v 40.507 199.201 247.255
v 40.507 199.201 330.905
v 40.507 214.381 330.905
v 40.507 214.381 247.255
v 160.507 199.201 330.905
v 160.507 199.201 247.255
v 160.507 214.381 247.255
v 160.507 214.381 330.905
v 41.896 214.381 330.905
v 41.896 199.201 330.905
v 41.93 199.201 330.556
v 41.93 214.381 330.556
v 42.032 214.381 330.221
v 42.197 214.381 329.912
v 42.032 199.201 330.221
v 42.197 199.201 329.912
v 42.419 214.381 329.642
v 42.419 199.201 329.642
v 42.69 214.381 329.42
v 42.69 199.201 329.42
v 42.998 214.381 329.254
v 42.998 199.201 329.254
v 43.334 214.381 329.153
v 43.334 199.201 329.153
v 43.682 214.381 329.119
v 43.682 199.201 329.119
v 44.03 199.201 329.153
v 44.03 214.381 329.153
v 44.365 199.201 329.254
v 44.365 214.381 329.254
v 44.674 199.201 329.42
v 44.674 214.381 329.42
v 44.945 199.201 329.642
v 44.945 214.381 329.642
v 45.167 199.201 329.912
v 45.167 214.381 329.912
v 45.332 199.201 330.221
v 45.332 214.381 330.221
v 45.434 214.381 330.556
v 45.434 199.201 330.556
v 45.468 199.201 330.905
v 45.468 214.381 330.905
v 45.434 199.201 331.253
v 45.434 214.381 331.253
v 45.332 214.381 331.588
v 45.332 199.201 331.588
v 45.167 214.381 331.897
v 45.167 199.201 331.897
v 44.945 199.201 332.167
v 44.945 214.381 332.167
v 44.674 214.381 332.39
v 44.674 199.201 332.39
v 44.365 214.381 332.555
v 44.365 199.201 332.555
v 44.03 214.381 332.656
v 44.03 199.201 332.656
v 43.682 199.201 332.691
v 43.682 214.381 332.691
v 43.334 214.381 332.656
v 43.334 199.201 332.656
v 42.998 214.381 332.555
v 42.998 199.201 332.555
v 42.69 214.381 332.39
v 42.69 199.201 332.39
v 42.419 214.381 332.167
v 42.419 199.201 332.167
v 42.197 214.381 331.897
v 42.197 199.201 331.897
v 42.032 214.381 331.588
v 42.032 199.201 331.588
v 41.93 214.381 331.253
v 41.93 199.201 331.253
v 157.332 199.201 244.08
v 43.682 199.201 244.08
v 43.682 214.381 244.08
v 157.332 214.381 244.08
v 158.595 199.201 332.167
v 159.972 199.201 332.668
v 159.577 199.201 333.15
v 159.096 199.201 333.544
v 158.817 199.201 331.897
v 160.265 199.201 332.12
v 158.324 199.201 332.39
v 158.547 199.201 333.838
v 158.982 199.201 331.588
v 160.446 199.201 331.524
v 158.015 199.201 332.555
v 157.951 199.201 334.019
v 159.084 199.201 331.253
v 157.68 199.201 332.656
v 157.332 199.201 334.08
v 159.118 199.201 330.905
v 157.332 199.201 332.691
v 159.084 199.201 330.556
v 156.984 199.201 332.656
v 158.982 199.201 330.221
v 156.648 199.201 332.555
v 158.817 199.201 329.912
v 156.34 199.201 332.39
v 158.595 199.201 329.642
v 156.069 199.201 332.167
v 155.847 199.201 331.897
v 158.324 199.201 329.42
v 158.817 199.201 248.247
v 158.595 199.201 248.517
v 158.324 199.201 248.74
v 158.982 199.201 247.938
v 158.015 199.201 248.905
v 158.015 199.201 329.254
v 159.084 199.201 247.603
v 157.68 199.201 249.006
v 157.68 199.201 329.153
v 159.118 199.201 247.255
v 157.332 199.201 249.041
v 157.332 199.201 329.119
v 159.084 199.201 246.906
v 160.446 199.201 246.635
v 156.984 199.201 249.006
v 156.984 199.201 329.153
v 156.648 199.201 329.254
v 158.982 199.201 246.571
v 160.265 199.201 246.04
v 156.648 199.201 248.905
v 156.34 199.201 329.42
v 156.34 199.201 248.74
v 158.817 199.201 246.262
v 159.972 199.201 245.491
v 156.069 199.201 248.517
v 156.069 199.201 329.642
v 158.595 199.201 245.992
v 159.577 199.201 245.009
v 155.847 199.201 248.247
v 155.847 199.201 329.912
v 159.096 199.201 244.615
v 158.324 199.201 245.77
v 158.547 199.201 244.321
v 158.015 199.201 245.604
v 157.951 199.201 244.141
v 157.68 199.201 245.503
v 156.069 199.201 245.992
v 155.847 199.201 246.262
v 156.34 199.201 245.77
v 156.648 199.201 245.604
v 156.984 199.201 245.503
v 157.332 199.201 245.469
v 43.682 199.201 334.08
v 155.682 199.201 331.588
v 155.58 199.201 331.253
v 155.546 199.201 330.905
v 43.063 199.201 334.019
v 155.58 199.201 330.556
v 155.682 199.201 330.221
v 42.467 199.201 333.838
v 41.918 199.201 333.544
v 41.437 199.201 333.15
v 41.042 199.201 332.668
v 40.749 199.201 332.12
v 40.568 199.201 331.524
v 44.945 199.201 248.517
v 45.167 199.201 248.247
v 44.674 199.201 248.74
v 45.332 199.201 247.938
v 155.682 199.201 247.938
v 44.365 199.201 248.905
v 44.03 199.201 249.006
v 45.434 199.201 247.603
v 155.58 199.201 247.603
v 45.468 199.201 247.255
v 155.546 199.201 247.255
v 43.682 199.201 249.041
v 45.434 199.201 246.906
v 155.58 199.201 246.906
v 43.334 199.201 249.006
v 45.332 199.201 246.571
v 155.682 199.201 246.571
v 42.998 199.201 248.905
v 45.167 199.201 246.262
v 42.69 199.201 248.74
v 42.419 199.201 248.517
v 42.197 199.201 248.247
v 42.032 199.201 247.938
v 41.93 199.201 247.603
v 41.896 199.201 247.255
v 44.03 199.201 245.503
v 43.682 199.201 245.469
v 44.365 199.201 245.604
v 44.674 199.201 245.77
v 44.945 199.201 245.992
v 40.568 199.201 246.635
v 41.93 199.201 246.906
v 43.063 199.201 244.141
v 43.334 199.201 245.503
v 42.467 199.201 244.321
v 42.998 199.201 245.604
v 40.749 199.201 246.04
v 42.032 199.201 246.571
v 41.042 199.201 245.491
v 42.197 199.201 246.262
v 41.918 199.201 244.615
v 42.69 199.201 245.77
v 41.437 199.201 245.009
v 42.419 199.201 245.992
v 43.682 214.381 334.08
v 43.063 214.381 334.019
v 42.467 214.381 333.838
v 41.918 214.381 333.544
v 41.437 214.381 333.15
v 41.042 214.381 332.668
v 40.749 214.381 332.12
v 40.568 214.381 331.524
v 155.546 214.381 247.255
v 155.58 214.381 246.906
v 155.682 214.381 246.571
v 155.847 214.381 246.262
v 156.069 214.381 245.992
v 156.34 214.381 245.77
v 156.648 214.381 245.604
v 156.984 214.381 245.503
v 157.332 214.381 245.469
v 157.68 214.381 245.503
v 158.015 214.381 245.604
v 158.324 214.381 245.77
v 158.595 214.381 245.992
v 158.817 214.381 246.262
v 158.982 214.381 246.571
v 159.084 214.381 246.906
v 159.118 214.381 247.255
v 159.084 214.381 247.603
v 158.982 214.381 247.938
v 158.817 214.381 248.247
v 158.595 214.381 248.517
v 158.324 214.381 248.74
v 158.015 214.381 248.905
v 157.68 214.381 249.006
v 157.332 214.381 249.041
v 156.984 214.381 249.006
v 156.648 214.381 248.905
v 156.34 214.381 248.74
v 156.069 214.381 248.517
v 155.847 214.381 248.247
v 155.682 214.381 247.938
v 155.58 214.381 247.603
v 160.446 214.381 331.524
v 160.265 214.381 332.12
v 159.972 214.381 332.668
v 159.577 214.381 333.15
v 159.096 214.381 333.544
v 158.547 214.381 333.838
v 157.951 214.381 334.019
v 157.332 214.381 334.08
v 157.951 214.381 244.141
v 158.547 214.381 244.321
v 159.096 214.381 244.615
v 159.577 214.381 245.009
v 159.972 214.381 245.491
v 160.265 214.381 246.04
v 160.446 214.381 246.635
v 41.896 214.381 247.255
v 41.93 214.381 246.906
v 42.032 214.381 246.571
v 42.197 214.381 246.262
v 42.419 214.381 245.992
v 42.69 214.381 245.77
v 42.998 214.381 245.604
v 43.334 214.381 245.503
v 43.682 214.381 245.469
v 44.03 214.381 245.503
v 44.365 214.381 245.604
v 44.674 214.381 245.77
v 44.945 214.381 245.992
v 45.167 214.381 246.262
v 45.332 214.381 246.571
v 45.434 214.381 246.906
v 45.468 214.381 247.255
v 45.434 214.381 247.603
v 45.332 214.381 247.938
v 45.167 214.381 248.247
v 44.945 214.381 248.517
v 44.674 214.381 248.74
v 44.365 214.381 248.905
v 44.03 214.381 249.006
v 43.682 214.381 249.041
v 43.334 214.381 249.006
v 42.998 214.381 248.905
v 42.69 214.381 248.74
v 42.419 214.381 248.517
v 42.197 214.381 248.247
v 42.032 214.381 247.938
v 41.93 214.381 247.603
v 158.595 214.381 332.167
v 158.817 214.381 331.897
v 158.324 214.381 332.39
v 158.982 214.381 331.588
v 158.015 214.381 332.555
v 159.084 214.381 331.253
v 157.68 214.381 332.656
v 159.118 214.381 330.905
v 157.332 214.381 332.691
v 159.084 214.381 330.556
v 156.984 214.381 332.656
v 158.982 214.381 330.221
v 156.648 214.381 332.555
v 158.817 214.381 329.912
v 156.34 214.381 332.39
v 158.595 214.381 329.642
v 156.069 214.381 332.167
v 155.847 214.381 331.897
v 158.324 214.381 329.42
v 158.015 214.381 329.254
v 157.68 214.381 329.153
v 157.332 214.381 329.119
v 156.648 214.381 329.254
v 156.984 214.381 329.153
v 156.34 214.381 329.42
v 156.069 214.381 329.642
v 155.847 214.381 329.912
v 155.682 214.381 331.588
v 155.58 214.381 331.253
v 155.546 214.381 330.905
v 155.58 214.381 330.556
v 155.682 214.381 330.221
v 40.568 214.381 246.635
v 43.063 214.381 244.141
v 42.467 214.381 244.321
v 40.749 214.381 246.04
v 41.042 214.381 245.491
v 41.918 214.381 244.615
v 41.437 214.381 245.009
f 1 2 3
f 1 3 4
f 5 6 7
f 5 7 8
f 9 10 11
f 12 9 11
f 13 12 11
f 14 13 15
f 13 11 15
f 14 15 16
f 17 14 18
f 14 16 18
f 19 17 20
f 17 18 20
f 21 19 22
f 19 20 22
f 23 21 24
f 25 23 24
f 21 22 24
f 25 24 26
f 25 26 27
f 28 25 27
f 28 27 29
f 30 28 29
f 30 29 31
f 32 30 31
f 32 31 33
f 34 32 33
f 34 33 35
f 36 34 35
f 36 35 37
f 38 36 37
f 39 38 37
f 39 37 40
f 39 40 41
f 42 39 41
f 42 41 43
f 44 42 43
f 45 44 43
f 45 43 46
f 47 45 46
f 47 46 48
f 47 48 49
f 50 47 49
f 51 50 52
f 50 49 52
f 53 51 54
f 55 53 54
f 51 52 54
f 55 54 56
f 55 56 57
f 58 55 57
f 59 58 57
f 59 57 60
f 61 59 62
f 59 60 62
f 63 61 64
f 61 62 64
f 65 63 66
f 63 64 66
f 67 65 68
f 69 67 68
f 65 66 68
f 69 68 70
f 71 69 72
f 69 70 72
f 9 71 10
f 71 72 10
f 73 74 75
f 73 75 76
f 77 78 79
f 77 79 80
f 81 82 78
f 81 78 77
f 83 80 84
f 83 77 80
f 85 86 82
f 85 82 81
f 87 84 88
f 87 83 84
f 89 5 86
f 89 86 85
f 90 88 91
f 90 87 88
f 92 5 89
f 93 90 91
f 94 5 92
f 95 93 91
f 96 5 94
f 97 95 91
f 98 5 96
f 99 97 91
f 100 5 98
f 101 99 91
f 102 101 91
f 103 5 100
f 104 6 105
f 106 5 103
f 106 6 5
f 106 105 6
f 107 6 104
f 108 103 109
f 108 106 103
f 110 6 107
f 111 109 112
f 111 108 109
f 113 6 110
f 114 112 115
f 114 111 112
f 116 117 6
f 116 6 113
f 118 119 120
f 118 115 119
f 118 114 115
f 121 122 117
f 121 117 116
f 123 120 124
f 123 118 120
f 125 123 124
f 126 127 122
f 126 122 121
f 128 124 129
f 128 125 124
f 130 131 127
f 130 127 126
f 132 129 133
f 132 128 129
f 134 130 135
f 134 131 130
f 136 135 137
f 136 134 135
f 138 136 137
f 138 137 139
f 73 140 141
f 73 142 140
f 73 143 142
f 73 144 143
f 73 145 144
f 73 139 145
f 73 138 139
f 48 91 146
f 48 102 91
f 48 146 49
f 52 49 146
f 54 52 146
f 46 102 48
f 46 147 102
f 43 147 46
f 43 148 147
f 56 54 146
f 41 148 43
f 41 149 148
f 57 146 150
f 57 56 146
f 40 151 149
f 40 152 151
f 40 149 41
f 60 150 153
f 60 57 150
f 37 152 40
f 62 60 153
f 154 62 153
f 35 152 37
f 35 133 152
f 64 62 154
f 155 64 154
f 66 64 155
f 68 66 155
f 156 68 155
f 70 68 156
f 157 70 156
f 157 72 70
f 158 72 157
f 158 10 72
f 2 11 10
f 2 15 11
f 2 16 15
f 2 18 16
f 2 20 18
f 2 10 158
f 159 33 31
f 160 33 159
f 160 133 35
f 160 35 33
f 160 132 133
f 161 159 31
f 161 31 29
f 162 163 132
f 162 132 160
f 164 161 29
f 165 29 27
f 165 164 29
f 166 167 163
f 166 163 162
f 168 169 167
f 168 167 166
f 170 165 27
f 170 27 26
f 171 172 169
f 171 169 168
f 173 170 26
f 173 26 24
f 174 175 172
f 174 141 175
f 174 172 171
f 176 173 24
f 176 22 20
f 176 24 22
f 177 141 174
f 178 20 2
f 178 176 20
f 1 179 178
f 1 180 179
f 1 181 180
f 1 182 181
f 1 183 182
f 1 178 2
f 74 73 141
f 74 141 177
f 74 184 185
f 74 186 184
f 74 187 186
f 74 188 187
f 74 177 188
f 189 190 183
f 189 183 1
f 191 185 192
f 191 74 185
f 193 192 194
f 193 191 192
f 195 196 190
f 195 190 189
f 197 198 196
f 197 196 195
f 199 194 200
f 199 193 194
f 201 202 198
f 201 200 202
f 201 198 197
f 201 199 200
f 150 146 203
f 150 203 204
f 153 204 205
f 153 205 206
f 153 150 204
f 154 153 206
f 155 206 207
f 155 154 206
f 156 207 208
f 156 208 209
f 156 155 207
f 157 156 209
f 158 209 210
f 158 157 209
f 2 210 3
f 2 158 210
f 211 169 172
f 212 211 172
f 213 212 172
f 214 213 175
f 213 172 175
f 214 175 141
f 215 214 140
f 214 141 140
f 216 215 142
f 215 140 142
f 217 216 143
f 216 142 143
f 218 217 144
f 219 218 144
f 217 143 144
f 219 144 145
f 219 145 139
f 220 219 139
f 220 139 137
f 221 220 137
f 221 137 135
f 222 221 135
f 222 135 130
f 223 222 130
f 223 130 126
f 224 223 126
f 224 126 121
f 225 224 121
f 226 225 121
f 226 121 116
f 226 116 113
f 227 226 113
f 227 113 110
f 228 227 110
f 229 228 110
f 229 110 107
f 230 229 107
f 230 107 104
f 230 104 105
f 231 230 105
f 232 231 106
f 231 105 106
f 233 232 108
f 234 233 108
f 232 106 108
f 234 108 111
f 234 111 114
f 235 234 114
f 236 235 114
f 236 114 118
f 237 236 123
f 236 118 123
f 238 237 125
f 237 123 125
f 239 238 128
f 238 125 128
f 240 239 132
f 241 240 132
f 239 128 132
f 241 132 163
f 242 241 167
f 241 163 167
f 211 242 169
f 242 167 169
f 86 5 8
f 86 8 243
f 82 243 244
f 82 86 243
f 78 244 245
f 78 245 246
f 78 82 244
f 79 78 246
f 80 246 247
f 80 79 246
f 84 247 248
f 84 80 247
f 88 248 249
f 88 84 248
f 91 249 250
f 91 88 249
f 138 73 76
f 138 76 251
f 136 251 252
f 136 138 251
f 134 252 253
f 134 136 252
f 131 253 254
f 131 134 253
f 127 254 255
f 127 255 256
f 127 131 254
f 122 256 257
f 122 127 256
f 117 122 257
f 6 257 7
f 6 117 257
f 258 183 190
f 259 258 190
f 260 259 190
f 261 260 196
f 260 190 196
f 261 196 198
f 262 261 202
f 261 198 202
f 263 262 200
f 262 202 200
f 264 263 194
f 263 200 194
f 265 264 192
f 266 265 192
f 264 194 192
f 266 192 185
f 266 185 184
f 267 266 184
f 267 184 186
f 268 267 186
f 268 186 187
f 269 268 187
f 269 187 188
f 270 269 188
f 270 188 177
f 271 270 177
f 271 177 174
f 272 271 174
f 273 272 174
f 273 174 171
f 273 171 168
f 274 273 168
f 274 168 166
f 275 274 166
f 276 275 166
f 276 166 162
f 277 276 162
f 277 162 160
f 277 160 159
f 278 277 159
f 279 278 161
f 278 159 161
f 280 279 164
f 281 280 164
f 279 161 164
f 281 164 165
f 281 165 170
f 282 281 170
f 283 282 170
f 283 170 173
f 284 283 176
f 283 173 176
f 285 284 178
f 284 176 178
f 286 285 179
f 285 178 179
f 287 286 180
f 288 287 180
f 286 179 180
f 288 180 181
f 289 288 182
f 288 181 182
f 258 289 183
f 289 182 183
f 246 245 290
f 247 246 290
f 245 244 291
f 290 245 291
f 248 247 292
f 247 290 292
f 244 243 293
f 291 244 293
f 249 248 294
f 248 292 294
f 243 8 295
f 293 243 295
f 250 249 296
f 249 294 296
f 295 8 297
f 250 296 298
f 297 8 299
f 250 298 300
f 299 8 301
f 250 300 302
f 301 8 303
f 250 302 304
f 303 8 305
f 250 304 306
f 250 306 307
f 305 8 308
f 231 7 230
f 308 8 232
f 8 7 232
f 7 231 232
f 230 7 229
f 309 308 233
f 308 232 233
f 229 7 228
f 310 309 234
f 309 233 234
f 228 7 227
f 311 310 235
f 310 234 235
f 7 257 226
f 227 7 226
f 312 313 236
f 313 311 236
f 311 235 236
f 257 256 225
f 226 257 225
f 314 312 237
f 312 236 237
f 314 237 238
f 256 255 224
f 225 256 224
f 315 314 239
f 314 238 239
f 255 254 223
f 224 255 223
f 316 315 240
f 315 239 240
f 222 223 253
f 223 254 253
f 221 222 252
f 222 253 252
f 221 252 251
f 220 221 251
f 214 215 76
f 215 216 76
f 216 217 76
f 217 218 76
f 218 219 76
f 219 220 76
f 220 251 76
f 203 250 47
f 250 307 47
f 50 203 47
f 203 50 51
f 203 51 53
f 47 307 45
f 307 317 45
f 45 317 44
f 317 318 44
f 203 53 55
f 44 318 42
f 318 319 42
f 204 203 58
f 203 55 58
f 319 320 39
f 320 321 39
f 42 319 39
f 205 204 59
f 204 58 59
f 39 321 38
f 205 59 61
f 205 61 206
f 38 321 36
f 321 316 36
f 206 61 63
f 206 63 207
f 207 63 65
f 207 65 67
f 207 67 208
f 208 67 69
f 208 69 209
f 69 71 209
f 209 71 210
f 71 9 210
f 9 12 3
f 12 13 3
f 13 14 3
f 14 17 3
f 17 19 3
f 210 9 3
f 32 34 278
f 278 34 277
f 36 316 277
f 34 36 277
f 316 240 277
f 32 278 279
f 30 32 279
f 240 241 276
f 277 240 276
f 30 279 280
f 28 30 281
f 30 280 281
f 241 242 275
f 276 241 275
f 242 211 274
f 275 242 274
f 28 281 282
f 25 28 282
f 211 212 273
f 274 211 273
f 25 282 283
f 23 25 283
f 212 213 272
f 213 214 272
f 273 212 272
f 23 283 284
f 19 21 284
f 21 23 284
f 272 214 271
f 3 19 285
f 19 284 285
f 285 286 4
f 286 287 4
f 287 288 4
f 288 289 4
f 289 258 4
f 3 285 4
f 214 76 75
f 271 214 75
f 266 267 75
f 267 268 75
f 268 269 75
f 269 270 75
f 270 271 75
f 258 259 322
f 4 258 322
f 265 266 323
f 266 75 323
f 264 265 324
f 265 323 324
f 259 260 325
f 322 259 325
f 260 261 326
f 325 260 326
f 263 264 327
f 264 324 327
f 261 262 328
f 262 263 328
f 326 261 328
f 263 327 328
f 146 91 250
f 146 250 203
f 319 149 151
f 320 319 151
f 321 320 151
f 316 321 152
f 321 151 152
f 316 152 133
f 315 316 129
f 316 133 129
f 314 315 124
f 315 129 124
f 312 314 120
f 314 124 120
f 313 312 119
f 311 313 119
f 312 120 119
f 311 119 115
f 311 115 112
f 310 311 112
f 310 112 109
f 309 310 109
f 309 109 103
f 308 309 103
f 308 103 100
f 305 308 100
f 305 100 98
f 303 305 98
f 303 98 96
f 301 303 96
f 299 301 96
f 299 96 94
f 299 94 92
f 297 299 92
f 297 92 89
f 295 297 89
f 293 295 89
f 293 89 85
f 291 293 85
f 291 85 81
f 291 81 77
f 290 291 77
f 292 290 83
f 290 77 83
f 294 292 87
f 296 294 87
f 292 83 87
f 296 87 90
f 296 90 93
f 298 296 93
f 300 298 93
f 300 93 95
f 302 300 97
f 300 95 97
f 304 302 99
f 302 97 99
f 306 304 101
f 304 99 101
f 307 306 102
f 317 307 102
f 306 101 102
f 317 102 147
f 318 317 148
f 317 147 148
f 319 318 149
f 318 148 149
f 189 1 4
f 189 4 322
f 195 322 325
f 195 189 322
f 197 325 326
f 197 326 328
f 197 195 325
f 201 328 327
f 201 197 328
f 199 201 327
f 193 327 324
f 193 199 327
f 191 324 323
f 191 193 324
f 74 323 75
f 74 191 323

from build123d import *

# Parameters (mm, degrees)
BOSS_EXTRUDE1_START             = -5.98
BOSS_EXTRUDE1_DEPTH             = 15.18
F_9_64_0_14063_DIAMETER_HOLE1_D = 3.572002


with BuildPart() as part:
    # Sketch1 → Boss-Extrude1 (new body)
    with BuildSketch(Plane(origin=(0, 205.181102149, 0), x_dir=(1, 0, 0), z_dir=(0, 1, 0)).offset(BOSS_EXTRUDE1_START)):
        with BuildLine():
            Line((43.681940653, -244.079539284), (157.331940653, -244.079539284))
            ThreePointArc((157.331940653, -244.079539284), (159.577004684, -245.009475254), (160.506940653, -247.254539284))
            Line((160.506940653, -247.254539284), (160.506940653, -330.904539284))
            ThreePointArc((160.506940653, -330.904539284), (159.577004684, -333.149603314), (157.331940653, -334.079539284))
            Line((157.331940653, -334.079539284), (43.681940653, -334.079539284))
            ThreePointArc((43.681940653, -334.079539284), (41.436876623, -333.149603314), (40.506940653, -330.904539284))
            Line((40.506940653, -330.904539284), (40.506940653, -247.254539284))
            ThreePointArc((40.506940653, -247.254539284), (41.436876623, -245.009475254), (43.681940653, -244.079539284))
        make_face()
    extrude(amount=BOSS_EXTRUDE1_DEPTH)

    # 9/64 (0.14063) Diameter Hole1 (through all)
    with Locations(Plane(origin=(0, 214.381102149, 0), x_dir=(1, 0, 0), z_dir=(0, 1, 0))):
        with Locations((43.681940653, -330.904539284), (43.681940653, -247.254539284), (157.331940653, -247.254539284), (157.331940653, -330.904539284)):
            Hole(F_9_64_0_14063_DIAMETER_HOLE1_D / 2)


solid = part.part
